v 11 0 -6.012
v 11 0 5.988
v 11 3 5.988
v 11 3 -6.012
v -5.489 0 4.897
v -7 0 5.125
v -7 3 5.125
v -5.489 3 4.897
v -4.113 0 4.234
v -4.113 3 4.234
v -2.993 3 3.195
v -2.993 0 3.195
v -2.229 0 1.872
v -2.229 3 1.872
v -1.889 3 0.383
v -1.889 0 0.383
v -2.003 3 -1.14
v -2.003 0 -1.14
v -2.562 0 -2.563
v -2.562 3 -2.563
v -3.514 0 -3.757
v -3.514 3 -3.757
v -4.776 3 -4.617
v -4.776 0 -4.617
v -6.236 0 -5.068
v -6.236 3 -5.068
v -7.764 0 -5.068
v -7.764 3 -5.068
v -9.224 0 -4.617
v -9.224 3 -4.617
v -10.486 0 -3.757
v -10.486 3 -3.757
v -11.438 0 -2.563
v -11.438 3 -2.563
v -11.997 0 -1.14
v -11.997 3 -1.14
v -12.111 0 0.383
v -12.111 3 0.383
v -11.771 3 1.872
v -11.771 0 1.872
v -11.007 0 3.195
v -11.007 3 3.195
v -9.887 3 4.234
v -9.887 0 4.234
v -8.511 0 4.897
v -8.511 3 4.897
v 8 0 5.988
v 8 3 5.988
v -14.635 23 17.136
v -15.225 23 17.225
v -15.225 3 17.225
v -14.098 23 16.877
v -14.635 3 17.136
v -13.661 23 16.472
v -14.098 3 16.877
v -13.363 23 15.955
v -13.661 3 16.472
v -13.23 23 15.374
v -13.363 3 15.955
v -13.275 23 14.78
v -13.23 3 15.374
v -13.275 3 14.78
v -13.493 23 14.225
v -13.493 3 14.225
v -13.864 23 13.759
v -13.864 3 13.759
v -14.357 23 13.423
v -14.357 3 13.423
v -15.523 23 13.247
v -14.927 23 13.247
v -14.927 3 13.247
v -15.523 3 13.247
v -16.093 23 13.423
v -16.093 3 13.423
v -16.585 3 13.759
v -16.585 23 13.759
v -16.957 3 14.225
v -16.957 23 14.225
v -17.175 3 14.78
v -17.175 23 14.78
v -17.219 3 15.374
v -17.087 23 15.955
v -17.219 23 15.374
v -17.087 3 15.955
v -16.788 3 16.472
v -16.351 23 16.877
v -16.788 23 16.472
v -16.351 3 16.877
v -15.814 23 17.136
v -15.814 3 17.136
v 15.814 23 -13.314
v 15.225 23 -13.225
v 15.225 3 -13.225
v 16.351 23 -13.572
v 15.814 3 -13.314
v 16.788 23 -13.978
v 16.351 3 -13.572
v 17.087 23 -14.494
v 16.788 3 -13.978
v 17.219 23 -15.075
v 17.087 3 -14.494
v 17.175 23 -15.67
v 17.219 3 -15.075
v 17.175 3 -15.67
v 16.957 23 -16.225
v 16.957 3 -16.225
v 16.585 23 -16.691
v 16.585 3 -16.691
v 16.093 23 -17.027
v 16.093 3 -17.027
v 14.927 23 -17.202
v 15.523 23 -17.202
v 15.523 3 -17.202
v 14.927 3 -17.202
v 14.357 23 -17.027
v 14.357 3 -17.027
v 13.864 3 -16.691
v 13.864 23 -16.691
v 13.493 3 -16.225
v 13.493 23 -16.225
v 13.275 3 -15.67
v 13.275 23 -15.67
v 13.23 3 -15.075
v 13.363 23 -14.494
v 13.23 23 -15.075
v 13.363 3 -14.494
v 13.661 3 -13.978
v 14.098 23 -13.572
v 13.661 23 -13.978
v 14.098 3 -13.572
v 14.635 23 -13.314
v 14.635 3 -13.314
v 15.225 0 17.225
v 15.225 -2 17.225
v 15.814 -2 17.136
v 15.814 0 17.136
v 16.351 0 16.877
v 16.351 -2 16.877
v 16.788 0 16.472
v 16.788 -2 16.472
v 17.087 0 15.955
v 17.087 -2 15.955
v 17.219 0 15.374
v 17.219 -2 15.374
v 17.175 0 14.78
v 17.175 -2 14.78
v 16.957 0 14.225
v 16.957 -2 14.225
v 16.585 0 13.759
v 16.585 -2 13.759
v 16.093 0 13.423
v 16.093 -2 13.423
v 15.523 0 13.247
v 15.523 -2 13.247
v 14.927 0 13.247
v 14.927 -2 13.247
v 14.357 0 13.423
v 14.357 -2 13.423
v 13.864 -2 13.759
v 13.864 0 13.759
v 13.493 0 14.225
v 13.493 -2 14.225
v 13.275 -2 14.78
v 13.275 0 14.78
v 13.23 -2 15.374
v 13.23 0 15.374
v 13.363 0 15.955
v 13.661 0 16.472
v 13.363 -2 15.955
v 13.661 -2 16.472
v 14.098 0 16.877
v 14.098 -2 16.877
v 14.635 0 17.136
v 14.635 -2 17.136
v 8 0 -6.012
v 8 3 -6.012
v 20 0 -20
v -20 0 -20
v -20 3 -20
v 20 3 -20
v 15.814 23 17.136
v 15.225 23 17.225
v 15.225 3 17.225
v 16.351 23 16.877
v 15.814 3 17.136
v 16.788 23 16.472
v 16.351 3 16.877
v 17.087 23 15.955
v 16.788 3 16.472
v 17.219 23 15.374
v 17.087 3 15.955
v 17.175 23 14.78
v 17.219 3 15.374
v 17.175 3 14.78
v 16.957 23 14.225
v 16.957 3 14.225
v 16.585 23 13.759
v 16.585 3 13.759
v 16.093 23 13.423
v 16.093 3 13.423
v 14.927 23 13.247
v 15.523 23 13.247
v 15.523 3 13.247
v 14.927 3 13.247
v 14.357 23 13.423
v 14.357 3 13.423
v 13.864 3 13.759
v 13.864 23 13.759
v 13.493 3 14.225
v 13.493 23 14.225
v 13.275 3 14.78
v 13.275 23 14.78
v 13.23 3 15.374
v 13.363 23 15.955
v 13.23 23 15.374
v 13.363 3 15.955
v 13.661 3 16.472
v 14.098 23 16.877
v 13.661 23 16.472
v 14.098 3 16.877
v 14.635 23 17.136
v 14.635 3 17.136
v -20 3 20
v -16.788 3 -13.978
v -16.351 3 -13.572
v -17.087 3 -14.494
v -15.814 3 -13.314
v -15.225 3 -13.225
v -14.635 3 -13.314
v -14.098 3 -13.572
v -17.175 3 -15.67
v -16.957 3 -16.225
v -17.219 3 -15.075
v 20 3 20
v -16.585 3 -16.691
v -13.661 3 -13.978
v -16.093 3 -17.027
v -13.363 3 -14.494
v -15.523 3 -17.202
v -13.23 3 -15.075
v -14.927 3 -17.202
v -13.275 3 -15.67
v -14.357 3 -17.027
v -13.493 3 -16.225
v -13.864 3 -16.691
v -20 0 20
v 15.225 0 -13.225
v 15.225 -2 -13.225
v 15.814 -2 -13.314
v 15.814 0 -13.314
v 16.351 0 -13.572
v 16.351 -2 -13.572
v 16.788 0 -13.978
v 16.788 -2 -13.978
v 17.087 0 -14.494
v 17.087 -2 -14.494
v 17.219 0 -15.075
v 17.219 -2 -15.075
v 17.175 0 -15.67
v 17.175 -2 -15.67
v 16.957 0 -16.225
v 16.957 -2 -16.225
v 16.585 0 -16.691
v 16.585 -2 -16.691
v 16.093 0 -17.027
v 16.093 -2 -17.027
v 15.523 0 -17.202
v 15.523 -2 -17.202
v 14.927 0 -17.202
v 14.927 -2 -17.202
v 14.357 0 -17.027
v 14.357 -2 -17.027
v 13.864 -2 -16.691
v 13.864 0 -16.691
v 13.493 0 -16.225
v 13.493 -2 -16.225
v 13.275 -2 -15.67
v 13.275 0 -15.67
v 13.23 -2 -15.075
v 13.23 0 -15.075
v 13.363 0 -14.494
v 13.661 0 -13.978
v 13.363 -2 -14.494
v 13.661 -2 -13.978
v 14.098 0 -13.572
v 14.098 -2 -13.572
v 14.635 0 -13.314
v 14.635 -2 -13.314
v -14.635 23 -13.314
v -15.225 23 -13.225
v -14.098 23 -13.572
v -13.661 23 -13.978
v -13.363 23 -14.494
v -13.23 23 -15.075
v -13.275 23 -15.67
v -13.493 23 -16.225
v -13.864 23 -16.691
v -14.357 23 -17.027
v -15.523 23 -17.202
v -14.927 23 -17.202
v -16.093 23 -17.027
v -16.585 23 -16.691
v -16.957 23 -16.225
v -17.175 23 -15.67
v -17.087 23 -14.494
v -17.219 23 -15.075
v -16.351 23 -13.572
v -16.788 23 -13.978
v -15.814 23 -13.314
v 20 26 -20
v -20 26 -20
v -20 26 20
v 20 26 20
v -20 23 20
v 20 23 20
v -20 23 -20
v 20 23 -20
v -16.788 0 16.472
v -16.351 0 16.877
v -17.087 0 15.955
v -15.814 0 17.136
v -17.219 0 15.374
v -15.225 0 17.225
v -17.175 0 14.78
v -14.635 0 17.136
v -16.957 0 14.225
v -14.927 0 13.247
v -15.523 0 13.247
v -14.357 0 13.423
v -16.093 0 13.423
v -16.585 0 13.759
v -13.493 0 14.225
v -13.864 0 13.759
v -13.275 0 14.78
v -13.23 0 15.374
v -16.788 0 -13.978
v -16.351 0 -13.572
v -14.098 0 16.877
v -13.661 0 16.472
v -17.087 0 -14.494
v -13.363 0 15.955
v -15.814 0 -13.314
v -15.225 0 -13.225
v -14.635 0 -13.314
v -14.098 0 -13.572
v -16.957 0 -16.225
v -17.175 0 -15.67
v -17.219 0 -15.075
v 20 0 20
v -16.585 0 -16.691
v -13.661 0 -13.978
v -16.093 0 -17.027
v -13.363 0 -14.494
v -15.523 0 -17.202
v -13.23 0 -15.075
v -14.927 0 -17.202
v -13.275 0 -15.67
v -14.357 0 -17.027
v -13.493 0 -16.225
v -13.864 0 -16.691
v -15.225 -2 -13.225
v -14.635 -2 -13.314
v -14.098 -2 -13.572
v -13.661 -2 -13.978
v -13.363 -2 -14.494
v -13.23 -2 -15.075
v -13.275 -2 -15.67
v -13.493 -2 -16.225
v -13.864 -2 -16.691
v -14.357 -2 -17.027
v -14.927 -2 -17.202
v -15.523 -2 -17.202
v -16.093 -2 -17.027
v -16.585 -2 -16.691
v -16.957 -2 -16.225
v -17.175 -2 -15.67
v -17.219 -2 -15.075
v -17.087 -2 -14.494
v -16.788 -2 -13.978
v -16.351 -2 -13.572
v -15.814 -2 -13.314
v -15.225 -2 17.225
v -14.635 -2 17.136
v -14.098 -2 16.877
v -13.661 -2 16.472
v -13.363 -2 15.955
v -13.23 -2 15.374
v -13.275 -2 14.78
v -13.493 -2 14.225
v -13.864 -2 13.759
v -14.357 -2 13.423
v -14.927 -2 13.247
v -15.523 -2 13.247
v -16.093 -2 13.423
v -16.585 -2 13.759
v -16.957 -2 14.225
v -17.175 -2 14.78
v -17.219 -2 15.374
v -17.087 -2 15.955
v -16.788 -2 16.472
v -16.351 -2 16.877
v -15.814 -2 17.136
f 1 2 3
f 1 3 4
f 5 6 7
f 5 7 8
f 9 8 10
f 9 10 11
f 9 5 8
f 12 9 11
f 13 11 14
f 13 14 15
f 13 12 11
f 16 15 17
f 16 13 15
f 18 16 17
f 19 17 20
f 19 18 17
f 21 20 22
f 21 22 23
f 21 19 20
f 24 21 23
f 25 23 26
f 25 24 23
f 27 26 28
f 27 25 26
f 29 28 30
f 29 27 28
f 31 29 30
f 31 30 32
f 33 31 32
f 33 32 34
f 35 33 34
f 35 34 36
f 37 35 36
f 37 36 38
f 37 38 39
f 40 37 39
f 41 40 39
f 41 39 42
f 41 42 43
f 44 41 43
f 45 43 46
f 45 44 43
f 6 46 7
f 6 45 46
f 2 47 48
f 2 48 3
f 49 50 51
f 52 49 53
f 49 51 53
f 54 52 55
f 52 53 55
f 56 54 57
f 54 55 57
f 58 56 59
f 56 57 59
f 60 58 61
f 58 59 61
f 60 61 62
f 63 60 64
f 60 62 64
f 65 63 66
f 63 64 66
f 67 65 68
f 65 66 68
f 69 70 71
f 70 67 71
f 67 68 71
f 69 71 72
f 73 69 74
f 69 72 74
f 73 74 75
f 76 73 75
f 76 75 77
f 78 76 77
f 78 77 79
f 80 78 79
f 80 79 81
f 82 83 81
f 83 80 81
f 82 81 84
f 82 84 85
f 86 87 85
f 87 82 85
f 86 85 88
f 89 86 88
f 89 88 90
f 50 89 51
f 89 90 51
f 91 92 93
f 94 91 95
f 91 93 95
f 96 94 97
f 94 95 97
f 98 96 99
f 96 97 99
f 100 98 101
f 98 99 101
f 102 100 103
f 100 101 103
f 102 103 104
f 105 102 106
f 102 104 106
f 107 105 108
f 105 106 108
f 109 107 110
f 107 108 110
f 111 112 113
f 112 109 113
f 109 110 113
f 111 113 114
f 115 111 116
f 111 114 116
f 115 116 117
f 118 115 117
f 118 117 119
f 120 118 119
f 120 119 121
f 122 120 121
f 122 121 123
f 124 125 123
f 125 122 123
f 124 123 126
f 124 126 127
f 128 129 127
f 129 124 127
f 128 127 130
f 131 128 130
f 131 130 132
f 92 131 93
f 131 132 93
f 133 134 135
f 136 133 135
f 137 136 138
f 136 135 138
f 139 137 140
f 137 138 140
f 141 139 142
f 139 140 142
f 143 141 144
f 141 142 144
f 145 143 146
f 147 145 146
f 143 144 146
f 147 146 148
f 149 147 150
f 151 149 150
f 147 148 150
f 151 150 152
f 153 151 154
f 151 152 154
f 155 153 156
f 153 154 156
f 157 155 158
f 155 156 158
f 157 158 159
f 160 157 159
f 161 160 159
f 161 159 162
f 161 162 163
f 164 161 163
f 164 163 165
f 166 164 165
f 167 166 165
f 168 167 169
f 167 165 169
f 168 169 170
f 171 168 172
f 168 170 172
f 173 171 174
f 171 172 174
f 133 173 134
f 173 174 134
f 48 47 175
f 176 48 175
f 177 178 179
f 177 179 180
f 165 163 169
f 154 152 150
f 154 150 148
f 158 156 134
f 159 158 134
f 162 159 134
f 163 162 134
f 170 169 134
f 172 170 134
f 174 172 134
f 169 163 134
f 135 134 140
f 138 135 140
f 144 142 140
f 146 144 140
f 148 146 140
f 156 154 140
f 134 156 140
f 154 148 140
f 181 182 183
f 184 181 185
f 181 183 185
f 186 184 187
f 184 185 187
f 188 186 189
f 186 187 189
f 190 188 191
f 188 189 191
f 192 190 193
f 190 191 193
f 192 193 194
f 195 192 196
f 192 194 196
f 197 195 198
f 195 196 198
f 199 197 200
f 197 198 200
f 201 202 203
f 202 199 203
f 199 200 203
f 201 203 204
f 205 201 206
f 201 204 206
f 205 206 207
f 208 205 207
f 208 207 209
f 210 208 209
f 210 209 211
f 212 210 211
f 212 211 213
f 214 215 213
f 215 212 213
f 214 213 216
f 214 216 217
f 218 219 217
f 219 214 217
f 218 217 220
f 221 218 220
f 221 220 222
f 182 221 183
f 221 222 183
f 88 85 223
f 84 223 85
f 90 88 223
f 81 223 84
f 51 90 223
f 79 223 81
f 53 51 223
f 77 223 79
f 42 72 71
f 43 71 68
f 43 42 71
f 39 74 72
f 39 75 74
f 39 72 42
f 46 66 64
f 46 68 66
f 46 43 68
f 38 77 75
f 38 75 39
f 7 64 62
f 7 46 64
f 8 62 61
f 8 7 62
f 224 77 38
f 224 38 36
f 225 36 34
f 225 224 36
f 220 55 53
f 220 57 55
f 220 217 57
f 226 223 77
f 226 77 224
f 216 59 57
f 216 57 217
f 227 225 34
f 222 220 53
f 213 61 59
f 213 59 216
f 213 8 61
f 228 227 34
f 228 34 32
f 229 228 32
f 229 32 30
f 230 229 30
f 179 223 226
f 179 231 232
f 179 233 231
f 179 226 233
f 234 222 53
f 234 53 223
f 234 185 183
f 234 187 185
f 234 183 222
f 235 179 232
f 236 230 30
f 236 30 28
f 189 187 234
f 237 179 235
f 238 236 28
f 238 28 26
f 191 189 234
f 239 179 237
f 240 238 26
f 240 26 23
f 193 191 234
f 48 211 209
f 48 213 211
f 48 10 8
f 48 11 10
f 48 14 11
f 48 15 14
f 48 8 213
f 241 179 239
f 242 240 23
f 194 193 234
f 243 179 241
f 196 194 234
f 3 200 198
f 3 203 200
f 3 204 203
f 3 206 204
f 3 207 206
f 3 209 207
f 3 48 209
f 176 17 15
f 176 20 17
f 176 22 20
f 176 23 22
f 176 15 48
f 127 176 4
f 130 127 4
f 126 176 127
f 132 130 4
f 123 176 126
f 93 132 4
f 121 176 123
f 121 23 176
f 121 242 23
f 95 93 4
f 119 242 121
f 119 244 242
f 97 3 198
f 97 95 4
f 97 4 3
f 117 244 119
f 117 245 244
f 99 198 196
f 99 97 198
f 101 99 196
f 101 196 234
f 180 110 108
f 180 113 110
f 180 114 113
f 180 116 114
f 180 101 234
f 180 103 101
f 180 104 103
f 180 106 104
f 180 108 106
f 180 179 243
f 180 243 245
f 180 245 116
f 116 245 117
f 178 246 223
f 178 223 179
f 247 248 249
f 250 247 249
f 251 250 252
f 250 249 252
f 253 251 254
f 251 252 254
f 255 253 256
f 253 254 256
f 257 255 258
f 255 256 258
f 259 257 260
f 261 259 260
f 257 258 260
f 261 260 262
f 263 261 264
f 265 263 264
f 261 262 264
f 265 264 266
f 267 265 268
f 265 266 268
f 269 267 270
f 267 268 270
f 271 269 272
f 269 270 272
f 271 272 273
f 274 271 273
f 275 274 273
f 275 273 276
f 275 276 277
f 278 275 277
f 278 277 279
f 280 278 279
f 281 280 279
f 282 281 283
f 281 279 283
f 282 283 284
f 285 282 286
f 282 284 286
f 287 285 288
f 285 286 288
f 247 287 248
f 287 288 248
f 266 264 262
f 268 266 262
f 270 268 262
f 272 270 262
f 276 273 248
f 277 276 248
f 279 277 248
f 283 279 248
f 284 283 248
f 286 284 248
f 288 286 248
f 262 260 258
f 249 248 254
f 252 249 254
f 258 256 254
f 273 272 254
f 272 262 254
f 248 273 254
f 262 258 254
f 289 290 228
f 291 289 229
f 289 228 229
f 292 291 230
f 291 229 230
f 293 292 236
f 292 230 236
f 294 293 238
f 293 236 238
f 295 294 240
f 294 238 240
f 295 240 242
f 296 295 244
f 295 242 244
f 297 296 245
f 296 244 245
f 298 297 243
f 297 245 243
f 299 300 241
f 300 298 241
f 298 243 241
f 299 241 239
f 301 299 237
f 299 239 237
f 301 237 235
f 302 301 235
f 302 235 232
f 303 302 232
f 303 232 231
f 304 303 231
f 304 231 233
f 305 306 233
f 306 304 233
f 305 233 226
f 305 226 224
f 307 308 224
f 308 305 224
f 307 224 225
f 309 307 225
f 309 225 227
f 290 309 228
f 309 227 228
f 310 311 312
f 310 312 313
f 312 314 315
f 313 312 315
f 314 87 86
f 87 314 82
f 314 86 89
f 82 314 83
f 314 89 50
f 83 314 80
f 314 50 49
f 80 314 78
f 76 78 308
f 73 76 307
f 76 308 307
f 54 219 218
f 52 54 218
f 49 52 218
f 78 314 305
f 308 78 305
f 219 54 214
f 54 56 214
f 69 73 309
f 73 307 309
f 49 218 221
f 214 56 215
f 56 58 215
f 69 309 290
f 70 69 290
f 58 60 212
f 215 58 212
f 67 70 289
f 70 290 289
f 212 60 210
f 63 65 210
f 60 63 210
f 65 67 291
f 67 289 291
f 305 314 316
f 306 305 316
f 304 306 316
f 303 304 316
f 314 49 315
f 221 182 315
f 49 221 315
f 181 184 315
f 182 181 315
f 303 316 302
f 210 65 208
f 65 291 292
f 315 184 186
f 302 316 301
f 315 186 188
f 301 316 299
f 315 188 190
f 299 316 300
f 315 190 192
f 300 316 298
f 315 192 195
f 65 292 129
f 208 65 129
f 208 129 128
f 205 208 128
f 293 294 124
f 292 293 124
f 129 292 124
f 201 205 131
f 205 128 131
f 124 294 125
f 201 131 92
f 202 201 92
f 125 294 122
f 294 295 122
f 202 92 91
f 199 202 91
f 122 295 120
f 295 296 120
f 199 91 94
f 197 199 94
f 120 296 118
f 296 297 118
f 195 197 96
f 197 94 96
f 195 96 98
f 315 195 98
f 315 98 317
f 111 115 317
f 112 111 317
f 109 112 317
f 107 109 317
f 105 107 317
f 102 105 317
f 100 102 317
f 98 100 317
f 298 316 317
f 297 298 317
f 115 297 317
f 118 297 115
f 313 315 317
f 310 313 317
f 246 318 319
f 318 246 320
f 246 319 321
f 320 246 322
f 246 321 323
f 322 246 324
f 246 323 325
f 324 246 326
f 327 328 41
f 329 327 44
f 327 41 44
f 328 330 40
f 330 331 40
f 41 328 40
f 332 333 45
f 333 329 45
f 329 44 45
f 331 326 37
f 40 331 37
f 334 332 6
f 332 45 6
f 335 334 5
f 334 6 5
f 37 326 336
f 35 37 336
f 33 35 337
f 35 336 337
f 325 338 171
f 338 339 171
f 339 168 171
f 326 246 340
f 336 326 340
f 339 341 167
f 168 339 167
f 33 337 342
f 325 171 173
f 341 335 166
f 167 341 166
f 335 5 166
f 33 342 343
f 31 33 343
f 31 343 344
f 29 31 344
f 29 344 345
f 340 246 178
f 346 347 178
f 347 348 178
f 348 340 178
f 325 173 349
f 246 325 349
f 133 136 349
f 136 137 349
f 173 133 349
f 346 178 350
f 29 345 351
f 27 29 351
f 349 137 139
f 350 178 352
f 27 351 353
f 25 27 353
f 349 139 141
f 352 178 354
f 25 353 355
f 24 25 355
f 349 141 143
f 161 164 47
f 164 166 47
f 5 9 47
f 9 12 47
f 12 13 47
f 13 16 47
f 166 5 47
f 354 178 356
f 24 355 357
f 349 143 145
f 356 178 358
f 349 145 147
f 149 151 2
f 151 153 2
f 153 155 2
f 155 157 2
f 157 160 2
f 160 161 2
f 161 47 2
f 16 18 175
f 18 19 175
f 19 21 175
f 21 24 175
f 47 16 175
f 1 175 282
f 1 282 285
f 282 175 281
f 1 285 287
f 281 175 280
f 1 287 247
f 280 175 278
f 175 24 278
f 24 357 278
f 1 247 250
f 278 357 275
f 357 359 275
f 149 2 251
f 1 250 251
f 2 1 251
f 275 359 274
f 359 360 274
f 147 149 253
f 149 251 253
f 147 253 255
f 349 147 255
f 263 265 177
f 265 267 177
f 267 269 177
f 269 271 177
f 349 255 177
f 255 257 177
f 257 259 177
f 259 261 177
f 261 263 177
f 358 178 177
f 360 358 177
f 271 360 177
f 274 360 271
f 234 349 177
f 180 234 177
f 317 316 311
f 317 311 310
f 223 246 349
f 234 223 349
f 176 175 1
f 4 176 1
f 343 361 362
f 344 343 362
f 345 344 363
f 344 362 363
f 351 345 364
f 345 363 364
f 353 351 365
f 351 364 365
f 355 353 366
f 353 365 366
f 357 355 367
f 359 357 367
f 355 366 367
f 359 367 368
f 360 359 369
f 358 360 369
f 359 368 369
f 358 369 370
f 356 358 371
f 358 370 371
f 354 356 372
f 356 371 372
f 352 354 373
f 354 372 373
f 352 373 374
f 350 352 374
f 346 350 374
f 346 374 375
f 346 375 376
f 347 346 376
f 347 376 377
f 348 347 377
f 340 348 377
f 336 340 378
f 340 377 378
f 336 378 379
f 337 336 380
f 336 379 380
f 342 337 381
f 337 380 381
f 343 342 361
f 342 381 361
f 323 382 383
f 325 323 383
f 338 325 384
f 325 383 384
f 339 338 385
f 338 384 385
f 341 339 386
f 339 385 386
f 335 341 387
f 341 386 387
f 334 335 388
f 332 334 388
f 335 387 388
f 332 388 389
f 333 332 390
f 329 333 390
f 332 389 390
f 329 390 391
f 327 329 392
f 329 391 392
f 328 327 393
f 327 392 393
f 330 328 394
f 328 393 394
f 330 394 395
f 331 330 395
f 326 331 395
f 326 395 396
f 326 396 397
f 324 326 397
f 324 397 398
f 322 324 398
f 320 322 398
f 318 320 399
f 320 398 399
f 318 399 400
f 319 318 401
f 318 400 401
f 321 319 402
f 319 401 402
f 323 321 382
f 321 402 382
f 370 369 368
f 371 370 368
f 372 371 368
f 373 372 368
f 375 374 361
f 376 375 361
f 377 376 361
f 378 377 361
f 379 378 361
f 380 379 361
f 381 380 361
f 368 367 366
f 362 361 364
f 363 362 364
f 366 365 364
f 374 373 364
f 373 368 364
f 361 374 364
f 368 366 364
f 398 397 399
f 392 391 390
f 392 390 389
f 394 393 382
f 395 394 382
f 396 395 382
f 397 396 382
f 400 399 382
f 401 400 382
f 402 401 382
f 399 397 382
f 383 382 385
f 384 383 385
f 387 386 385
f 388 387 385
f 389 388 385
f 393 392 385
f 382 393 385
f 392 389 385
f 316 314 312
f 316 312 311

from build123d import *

# Parameters (mm, degrees)
SKETCH_2_W          = 40
SKETCH_2_H          = 40
EXTRUDE_2_DEPTH     = 3
SKETCH_3_R          = 2
SKETCH_3_R_2        = 5.125
SKETCH_3_W          = 3
SKETCH_3_H          = 12
CUT_EXTRUDE_1_DEPTH = 3
EXTRUDE_START       = 20
SKETCH_9_W          = 40
SKETCH_9_H          = 40
EXTRUDE_4_DEPTH     = 3
SKETCH_3_3_R        = 2
EXTRUDE_5_DEPTH     = 24
EXTRUDE_START_2     = -2
SKETCH_2_8_R        = 2
EXTRUDE_6_DEPTH     = 2


with BuildPart() as part:
    # 草图2 → 凸台-拉伸2 (new body)
    with BuildSketch(Plane(origin=(0, 0, 0), x_dir=(1, 0, 0), z_dir=(0, 1, 0))):
        Rectangle(SKETCH_2_W, SKETCH_2_H)
    extrude(amount=EXTRUDE_2_DEPTH)

    # 草图3 → 切除-拉伸1 (cut)
    with BuildSketch(Plane(origin=(0, 0, 0), x_dir=(1, 0, 0), z_dir=(0, 1, 0))):
        with Locations((-15.224798987, -15.224798987)):
            Circle(SKETCH_3_R)
        with Locations((15.224798987, -15.224798987)):
            Circle(SKETCH_3_R)
        with Locations((15.224798987, 15.224798987)):
            Circle(SKETCH_3_R)
        with Locations((-15.224798987, 15.224798987)):
            Circle(SKETCH_3_R)
        with Locations((-7, 0)):
            Circle(SKETCH_3_R_2)
        with Locations((9.5, 0.011605537)):
            Rectangle(SKETCH_3_W, SKETCH_3_H)
    extrude(amount=CUT_EXTRUDE_1_DEPTH, mode=Mode.SUBTRACT)



with BuildPart() as body_2:
    # 草图9 → 凸台-拉伸4 (new body)
    with BuildSketch(Plane(origin=(0, 3, 0), x_dir=(1, 0, 0), z_dir=(0, 1, 0)).offset(EXTRUDE_START)):
        Rectangle(SKETCH_9_W, SKETCH_9_H)
    extrude(amount=EXTRUDE_4_DEPTH)

    # 草图3<3> → 凸台-拉伸5 (add)
    with BuildSketch(Plane(origin=(0, 0, 0), x_dir=(1, 0, 0), z_dir=(0, 1, 0))):
        with Locations((-15.224798987, -15.224798987)):
            Circle(SKETCH_3_3_R)
        with Locations((15.224798987, -15.224798987)):
            Circle(SKETCH_3_3_R)
        with Locations((15.224798987, 15.224798987)):
            Circle(SKETCH_3_3_R)
        with Locations((-15.224798987, 15.224798987)):
            Circle(SKETCH_3_3_R)
    extrude(amount=EXTRUDE_5_DEPTH)


with BuildPart() as part_1:
    add(part.part)

    add(body_2.part)  # 凸台-拉伸6 merges body 2
    # 草图2<8> → 凸台-拉伸6 (add)
    with BuildSketch(Plane(origin=(0, 0, 0), x_dir=(1, 0, 0), z_dir=(0, 1, 0)).offset(EXTRUDE_START_2)):
        with Locations((15.224798987, 15.224798987)):
            Circle(SKETCH_2_8_R)
        with Locations((-15.224798987, -15.224798987)):
            Circle(SKETCH_2_8_R)
        with Locations((15.224798987, -15.224798987)):
            Circle(SKETCH_2_8_R)
        with Locations((-15.224798987, 15.224798987)):
            Circle(SKETCH_2_8_R)
    extrude(amount=EXTRUDE_6_DEPTH)


solid = part_1.part
